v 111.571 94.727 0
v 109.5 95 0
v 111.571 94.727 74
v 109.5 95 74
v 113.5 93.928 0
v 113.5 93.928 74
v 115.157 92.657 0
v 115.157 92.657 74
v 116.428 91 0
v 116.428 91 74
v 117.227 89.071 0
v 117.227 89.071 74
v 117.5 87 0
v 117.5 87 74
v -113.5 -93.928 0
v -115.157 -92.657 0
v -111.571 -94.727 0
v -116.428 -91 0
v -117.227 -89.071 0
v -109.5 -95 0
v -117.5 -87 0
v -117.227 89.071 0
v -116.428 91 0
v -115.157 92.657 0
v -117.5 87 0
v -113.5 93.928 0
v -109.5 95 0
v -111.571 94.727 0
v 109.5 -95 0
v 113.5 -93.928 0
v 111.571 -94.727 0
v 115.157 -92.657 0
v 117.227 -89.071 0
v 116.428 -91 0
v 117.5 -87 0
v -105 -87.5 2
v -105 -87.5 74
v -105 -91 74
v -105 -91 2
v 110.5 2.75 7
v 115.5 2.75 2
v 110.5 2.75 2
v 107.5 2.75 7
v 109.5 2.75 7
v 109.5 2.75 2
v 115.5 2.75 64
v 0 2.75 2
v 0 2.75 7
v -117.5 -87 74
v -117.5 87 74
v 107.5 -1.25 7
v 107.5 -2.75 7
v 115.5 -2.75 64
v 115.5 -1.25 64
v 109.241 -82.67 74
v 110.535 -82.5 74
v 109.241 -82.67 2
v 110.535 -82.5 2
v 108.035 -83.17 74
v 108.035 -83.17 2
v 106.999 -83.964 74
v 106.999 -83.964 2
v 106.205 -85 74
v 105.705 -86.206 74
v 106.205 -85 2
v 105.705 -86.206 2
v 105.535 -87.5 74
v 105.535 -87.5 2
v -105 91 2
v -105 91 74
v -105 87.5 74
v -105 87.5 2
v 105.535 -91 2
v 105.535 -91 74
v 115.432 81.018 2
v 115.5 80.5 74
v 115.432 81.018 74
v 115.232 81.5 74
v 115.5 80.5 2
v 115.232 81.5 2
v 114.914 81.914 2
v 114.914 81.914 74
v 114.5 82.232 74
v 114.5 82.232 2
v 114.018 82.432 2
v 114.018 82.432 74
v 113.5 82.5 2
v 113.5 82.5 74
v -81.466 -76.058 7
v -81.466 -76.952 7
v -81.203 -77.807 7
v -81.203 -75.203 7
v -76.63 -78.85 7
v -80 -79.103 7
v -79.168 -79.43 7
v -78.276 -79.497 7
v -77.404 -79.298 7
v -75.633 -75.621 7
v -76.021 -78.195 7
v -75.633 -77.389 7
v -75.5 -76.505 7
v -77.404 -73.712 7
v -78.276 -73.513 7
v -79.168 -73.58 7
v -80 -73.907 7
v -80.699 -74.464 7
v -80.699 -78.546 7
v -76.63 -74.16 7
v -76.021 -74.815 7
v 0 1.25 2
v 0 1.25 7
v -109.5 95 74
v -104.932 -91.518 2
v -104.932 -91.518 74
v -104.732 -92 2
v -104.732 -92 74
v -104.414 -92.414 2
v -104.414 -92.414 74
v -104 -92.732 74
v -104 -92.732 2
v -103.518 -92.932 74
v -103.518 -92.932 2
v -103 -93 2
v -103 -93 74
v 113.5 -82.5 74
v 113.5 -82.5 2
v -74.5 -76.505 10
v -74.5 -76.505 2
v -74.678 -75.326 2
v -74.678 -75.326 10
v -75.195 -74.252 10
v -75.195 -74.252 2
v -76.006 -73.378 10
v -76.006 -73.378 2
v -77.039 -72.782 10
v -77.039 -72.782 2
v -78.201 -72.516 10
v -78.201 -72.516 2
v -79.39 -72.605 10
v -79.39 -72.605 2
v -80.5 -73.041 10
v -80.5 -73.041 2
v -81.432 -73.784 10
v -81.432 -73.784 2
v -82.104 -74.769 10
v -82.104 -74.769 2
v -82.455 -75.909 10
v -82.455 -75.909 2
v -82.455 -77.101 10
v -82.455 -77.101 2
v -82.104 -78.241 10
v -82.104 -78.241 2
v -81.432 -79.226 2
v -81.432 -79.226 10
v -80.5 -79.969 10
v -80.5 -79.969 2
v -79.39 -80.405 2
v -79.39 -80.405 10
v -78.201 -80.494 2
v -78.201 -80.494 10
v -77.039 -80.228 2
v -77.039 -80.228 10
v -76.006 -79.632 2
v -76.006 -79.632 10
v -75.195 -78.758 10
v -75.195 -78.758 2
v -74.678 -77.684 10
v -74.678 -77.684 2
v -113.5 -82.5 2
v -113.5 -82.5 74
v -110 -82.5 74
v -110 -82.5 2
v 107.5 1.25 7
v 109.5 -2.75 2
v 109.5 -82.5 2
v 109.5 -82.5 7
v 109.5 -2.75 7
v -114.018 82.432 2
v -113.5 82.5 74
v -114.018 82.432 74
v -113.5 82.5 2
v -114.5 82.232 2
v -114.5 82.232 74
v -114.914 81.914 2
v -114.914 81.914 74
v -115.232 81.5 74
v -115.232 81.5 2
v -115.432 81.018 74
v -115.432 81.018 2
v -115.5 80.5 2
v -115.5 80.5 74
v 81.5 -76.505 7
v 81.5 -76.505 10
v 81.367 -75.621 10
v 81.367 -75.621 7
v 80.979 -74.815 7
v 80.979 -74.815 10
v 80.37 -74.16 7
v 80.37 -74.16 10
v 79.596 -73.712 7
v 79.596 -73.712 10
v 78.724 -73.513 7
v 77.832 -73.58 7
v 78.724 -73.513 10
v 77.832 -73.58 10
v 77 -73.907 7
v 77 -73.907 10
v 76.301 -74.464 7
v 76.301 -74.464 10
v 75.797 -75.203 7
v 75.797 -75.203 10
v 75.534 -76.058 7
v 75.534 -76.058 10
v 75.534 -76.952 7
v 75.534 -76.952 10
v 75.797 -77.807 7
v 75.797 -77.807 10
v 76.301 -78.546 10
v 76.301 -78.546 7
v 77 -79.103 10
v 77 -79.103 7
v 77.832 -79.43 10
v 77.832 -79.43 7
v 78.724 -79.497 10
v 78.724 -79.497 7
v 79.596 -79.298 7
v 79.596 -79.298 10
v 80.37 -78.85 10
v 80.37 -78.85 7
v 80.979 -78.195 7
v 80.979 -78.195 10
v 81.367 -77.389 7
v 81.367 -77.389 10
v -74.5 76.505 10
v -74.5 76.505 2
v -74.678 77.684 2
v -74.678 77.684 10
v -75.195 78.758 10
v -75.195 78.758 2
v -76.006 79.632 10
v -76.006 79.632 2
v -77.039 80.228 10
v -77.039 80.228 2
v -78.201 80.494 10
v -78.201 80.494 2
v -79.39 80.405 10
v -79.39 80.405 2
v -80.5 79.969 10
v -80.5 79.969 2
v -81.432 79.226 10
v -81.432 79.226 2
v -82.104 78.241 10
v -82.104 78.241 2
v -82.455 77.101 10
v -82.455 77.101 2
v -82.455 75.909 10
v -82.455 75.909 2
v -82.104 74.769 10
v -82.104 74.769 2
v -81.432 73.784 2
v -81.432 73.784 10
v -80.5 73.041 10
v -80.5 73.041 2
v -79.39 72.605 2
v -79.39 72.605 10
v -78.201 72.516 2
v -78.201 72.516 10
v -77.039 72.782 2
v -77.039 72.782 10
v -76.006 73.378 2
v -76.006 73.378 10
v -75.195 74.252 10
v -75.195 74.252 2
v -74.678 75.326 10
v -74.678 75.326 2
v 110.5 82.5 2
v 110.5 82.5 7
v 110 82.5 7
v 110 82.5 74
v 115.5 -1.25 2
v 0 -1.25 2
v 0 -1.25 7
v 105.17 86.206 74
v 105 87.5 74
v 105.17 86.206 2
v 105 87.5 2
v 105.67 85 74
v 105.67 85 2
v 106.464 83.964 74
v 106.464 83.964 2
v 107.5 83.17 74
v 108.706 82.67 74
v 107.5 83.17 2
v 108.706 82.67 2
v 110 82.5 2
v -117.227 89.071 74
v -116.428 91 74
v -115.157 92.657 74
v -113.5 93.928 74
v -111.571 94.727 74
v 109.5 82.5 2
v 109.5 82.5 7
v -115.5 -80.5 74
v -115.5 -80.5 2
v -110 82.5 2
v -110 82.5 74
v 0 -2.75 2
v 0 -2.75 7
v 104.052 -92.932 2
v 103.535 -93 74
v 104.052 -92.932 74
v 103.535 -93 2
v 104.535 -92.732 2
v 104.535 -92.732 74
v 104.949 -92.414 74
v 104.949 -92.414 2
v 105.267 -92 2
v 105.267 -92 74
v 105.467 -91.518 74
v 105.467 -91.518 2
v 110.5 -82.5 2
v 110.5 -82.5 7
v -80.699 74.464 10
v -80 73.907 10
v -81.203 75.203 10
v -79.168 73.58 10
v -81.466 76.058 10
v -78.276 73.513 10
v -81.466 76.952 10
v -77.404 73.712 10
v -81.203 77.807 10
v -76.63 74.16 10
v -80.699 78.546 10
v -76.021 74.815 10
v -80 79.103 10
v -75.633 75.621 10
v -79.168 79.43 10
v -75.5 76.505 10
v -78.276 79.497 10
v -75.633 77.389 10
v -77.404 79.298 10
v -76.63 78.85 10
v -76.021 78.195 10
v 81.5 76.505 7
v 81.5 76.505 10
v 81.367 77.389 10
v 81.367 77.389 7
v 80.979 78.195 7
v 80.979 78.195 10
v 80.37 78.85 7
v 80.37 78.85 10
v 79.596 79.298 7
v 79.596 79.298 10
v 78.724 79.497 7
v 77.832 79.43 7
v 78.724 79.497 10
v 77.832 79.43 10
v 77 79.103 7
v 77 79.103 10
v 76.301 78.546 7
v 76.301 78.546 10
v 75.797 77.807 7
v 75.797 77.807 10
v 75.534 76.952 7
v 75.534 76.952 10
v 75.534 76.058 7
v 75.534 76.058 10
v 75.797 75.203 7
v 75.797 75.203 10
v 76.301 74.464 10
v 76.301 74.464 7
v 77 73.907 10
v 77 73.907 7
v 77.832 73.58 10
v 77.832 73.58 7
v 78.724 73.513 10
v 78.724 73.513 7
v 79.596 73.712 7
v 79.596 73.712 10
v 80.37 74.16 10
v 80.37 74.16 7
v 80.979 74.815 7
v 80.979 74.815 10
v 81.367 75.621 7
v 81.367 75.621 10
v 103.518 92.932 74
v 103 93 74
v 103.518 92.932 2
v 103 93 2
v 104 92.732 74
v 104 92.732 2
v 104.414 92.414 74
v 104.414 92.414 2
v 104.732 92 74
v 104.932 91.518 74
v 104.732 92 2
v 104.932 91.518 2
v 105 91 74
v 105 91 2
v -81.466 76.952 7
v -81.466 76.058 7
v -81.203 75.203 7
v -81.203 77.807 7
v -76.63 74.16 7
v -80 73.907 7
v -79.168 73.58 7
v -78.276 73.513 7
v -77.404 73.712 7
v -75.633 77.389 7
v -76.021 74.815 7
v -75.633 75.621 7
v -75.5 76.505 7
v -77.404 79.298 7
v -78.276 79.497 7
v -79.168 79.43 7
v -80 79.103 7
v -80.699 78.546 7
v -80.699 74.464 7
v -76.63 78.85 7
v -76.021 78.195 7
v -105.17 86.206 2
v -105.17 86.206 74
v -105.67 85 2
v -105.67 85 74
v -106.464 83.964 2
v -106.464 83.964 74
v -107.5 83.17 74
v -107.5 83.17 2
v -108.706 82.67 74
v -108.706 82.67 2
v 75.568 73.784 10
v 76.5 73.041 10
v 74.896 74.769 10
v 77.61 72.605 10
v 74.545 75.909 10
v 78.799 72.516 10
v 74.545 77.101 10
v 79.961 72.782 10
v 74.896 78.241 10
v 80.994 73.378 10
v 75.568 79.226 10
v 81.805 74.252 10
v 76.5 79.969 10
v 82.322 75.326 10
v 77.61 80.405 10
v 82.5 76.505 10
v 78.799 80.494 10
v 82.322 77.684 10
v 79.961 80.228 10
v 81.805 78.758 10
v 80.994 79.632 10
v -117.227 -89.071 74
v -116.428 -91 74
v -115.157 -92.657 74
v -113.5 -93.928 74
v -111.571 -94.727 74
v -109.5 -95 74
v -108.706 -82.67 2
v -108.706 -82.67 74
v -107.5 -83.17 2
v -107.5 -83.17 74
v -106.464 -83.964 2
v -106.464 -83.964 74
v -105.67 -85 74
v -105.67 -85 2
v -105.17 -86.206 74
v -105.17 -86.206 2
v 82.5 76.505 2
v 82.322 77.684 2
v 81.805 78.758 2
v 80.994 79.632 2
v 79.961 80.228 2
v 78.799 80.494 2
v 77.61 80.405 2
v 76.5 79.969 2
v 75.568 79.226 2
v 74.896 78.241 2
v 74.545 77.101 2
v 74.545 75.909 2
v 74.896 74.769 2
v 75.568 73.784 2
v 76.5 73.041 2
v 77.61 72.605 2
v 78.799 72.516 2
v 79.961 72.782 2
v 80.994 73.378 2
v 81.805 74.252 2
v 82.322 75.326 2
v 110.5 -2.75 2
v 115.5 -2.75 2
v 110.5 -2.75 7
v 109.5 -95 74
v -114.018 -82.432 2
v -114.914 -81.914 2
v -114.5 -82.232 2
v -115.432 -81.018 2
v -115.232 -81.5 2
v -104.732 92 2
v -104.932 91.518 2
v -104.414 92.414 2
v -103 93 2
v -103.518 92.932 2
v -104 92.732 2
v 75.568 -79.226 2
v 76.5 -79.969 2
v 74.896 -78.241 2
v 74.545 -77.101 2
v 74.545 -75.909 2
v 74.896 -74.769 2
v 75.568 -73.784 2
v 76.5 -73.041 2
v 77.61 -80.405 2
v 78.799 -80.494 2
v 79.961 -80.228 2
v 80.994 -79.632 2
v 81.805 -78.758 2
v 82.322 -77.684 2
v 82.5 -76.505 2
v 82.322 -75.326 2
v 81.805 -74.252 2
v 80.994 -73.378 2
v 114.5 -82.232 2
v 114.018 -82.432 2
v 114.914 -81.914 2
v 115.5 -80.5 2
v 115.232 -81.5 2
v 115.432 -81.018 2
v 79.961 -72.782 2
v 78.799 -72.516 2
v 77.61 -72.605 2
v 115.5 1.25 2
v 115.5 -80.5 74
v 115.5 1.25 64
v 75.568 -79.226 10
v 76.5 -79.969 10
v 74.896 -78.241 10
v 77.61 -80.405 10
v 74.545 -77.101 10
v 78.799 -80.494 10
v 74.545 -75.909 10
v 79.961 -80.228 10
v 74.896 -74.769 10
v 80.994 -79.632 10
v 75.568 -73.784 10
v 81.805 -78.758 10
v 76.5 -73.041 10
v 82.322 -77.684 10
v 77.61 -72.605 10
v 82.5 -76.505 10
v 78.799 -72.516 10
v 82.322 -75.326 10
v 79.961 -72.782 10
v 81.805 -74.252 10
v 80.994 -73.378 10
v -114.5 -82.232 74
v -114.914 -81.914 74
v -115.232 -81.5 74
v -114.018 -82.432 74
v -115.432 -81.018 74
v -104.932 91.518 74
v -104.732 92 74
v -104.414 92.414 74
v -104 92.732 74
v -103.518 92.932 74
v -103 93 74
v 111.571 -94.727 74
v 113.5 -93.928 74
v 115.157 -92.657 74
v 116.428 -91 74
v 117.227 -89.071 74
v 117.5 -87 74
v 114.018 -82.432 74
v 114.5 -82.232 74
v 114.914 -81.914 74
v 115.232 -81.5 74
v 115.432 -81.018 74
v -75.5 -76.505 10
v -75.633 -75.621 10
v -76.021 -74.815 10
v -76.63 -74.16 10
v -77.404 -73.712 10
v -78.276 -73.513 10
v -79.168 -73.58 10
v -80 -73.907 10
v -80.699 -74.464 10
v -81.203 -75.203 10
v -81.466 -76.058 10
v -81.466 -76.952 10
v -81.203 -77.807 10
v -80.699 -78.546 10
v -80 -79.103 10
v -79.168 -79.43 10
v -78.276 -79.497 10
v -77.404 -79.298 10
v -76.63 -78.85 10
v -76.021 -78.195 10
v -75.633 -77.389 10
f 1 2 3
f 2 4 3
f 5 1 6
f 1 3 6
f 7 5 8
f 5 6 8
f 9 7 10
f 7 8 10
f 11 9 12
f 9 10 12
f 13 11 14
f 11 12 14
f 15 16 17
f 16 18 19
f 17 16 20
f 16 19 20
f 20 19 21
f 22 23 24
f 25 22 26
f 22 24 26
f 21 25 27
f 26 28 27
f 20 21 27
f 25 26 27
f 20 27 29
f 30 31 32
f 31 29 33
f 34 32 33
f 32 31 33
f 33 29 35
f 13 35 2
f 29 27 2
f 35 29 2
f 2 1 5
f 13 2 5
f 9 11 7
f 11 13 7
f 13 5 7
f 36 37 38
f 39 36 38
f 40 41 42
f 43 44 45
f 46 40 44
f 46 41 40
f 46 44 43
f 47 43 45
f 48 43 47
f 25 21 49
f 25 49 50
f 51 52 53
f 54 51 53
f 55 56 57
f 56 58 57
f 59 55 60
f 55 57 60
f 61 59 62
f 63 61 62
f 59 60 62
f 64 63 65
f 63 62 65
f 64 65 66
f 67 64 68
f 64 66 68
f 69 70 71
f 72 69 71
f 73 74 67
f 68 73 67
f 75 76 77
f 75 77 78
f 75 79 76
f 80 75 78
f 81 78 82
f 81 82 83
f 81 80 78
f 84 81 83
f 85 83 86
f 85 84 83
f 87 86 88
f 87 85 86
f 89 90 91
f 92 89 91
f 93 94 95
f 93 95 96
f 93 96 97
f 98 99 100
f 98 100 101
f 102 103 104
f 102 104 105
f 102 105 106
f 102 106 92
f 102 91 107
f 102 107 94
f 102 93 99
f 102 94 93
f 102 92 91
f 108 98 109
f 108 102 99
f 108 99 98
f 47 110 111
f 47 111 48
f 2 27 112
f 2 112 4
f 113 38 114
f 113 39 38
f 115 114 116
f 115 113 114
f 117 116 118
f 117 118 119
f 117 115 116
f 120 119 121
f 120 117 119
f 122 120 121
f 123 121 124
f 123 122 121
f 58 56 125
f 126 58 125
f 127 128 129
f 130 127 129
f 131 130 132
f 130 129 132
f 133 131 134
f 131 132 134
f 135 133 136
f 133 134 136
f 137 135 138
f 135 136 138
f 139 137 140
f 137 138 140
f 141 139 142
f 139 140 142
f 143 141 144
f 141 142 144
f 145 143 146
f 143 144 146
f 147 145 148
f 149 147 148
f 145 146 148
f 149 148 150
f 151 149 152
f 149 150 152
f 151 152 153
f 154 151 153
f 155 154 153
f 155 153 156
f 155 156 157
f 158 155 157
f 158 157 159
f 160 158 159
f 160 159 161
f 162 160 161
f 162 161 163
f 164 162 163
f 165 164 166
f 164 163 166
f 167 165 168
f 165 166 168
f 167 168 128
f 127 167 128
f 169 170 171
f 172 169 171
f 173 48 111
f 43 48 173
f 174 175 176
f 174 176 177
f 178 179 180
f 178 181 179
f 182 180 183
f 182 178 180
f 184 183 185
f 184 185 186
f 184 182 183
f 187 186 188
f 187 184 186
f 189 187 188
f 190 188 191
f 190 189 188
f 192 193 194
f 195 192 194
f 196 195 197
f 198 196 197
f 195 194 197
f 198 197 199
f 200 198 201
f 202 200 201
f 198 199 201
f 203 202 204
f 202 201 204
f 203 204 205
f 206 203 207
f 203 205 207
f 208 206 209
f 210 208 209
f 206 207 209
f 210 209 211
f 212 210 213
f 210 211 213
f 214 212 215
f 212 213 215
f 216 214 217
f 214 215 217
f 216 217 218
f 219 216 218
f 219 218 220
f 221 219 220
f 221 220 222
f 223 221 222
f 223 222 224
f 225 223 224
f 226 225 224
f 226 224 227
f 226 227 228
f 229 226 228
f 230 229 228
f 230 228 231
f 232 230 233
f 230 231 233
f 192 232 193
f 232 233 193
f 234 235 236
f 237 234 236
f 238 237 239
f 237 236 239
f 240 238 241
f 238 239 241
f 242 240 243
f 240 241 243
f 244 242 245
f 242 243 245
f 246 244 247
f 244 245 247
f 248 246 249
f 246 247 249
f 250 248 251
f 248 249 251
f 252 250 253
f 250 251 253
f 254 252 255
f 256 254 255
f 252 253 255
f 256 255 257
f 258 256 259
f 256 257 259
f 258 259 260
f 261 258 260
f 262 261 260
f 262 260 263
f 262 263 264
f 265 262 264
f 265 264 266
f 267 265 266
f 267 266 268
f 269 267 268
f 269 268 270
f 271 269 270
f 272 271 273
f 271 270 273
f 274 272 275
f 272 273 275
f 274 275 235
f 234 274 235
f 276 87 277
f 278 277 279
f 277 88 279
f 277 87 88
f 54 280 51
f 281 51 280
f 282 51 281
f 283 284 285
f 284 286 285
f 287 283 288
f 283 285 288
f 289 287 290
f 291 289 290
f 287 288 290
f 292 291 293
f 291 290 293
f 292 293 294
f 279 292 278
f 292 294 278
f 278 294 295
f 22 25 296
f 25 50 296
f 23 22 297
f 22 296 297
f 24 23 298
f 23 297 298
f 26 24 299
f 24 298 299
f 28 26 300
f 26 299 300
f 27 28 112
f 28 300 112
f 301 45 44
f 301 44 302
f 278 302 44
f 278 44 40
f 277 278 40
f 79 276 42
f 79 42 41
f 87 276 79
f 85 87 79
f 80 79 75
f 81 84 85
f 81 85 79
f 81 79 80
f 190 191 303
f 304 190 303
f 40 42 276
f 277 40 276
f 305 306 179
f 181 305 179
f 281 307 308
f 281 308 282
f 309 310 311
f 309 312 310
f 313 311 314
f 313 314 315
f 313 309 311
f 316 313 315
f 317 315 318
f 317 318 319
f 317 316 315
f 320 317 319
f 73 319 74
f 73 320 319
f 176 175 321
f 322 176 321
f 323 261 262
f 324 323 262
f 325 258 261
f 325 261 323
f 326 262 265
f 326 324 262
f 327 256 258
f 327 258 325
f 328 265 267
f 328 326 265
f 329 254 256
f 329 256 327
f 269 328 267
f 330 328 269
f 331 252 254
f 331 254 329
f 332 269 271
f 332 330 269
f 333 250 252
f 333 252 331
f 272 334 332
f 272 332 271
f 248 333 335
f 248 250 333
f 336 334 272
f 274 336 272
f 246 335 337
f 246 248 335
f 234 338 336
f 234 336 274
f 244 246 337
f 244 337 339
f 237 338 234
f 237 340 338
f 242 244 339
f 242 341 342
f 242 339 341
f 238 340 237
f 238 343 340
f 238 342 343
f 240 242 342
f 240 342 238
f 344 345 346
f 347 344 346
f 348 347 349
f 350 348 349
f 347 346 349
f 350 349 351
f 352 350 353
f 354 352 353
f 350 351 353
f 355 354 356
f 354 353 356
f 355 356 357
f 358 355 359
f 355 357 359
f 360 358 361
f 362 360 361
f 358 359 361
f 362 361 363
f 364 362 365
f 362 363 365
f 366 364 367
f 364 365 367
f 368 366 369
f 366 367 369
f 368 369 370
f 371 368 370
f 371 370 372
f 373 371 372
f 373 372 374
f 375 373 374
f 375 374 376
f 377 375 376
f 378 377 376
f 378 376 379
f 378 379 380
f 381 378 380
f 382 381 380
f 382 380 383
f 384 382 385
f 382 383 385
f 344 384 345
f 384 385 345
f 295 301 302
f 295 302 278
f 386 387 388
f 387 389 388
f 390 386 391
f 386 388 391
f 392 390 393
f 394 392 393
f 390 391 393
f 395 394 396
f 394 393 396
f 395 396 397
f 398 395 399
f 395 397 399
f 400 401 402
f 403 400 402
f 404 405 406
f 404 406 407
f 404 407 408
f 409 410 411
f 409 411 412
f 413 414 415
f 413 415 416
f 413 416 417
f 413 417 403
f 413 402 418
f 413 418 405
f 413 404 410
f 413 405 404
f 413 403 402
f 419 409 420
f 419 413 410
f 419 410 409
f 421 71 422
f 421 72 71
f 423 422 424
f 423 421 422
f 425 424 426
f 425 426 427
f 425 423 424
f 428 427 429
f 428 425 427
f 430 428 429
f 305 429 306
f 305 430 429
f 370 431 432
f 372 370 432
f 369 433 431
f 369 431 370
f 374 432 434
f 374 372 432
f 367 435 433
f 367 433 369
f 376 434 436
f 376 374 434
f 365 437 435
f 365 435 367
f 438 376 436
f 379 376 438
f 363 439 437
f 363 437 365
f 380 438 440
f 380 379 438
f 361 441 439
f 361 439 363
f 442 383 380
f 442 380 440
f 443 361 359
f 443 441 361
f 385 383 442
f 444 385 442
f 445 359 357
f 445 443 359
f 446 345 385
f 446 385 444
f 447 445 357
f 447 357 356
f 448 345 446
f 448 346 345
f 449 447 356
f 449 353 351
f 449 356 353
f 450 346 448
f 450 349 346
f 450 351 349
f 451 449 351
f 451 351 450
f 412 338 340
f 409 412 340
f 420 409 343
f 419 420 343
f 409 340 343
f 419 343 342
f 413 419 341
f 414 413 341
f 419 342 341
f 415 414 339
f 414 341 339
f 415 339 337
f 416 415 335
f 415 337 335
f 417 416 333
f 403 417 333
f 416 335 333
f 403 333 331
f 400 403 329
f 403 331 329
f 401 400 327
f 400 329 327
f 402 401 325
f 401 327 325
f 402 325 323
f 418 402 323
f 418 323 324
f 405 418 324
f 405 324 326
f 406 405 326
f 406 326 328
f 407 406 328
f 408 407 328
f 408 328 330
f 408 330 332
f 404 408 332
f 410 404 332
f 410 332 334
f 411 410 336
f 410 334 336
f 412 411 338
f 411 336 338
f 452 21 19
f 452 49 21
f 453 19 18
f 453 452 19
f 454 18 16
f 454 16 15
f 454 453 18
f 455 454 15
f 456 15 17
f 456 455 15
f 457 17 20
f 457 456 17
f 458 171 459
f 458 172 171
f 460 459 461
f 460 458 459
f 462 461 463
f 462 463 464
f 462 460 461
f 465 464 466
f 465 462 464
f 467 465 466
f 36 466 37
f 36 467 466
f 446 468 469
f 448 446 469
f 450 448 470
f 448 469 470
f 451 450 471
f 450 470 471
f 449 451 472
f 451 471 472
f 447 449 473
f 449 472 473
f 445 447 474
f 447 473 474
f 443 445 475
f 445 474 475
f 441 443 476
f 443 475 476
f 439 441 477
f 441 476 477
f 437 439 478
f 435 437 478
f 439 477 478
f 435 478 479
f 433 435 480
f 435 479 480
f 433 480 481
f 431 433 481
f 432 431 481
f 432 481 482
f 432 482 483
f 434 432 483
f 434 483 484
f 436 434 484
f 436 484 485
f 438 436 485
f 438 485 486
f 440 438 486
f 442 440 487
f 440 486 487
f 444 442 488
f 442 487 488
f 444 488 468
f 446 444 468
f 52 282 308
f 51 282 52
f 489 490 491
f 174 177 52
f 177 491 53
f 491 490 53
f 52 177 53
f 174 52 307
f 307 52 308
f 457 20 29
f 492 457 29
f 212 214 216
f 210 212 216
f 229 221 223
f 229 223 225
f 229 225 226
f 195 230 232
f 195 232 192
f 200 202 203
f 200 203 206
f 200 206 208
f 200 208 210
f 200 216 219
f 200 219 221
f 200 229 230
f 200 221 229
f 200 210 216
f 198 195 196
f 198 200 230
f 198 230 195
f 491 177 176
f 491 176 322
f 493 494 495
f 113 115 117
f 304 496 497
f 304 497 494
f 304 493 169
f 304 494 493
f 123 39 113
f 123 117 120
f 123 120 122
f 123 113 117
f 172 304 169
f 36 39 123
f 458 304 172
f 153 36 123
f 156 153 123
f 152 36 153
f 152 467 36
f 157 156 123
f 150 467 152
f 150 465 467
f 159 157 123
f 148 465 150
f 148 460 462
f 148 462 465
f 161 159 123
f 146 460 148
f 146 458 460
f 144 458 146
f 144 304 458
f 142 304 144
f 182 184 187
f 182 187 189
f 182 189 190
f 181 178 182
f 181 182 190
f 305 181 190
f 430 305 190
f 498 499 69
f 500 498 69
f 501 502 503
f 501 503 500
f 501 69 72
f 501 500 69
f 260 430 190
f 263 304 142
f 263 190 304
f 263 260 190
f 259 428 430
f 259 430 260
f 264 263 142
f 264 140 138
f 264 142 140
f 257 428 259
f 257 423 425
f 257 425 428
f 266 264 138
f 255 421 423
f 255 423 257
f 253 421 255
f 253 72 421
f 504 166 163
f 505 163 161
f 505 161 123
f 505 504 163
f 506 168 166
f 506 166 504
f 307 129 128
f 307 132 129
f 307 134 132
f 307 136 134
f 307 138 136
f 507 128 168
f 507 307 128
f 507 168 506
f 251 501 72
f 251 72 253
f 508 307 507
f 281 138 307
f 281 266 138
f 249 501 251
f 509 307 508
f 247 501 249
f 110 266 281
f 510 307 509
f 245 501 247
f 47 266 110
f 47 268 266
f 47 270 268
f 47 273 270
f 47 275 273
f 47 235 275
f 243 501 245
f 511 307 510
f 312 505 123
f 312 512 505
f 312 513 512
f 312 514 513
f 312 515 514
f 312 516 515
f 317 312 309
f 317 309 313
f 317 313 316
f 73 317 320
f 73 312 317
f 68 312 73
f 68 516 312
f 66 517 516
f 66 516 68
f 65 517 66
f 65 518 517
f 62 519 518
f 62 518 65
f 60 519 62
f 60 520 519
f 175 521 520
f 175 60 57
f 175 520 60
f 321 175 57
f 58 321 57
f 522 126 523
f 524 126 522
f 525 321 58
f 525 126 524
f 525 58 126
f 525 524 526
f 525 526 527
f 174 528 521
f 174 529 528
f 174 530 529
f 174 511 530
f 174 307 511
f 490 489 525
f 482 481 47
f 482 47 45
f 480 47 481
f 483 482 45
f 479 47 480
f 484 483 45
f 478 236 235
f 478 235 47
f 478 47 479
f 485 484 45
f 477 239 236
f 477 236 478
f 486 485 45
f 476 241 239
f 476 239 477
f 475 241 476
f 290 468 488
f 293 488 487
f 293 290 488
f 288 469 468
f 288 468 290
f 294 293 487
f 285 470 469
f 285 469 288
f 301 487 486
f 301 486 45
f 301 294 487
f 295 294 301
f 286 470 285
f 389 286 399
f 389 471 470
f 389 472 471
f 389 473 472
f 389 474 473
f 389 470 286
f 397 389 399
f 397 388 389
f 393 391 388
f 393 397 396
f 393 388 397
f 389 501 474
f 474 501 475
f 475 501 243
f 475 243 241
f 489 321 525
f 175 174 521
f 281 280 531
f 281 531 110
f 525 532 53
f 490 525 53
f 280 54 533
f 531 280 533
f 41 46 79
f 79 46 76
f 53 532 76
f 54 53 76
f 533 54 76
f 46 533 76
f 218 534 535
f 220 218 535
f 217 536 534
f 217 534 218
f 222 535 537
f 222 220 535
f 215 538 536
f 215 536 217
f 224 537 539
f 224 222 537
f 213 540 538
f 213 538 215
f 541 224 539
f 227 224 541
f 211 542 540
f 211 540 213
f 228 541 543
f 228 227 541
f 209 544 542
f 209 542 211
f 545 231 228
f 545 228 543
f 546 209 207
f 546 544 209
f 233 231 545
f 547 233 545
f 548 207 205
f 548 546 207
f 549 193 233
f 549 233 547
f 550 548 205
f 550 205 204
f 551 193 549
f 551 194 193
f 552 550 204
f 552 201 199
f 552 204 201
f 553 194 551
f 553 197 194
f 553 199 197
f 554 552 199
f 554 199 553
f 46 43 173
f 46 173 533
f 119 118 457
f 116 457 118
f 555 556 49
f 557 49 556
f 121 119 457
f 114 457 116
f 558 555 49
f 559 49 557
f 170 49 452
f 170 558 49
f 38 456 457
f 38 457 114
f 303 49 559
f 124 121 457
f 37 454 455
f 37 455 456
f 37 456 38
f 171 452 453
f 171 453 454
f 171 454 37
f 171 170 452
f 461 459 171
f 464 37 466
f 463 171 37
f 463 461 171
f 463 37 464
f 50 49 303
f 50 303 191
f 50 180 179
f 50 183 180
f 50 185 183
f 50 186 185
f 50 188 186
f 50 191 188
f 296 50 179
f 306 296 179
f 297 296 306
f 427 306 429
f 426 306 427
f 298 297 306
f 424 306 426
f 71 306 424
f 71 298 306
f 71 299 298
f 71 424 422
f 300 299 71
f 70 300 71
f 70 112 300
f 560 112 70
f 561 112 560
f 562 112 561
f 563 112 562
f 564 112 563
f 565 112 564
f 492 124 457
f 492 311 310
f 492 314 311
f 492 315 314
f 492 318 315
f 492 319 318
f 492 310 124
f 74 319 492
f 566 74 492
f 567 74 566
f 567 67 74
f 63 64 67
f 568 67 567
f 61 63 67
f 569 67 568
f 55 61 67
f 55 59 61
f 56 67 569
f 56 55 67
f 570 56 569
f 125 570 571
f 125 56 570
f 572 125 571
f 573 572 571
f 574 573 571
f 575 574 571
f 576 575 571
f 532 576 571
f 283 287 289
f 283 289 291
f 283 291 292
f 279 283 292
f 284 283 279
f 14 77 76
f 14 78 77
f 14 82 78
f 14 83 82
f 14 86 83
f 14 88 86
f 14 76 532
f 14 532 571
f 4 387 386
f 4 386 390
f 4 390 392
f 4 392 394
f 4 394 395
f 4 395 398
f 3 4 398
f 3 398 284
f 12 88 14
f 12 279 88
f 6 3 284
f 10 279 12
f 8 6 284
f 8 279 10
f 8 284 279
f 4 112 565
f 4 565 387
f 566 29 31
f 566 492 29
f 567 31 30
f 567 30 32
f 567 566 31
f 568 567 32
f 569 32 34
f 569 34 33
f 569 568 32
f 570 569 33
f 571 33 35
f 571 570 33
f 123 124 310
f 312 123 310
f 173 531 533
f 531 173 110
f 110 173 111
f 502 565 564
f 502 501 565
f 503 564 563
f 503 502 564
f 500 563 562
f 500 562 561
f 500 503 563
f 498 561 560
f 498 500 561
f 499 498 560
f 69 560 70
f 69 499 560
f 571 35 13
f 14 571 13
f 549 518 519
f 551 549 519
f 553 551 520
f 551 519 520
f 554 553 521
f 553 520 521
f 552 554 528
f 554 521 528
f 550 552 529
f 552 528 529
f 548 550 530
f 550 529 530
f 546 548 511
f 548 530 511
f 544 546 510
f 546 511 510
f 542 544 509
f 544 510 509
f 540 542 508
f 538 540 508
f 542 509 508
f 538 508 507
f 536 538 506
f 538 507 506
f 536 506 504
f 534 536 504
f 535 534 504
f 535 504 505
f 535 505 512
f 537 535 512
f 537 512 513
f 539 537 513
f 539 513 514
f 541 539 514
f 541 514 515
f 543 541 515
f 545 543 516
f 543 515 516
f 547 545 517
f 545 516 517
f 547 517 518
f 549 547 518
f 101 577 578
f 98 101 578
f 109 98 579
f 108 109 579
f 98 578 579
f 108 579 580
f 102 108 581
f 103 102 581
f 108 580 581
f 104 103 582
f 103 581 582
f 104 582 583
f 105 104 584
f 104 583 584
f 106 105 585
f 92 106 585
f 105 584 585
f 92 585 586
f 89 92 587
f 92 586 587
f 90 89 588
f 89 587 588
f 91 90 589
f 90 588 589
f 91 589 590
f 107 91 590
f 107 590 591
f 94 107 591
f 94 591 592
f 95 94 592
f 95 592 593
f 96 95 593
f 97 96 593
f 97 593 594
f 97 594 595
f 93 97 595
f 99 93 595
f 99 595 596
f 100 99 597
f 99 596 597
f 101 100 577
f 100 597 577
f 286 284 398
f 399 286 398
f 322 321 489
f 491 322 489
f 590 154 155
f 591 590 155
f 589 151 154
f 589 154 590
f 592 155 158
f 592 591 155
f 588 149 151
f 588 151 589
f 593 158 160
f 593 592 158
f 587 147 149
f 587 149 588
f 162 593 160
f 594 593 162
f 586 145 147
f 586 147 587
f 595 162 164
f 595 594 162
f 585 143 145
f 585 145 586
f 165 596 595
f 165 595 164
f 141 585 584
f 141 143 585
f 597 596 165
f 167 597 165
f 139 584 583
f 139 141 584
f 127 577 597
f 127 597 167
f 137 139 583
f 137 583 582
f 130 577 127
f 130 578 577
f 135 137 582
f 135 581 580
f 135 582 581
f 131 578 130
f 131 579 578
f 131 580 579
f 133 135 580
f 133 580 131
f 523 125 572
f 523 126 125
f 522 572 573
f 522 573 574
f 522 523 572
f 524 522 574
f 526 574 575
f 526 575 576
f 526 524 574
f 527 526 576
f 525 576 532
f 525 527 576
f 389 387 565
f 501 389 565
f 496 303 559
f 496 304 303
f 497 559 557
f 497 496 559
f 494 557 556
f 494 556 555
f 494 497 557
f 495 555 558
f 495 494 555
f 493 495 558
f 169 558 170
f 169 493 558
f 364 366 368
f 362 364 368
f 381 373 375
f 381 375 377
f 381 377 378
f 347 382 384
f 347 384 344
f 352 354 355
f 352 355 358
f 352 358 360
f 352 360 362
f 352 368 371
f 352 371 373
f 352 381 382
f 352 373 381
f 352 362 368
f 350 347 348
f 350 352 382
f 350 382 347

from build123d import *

# Parameters (mm, degrees)
SKETCH1_W           = 235
SKETCH1_H           = 190
BOSS_EXTRUDE1_DEPTH = 74
CUT_EXTRUDE1_DEPTH  = 72
FILLET1_R           = 2
FILLET2_R           = 5
SKETCH3_R           = 4
BOSS_EXTRUDE2_DEPTH = 8
FILLET3_R           = 8
SKETCH4_R           = 3
CUT_EXTRUDE2_DEPTH  = 3
SKETCH5_W           = 1
SKETCH5_H           = 165
BOSS_EXTRUDE3_DEPTH = 5
SKETCH6_W           = 115.5
SKETCH6_H           = 1.5
BOSS_EXTRUDE4_DEPTH = 5
BOSS_EXTRUDE5_DEPTH = 1.5
SKETCH8_W           = 5
SKETCH8_H           = 2.5
CUT_EXTRUDE3_DEPTH  = 5


with BuildPart() as part:
    # Sketch1 → Boss-Extrude1 (new body)
    with BuildSketch(Plane.XY):
        Rectangle(SKETCH1_W, SKETCH1_H)
    extrude(amount=BOSS_EXTRUDE1_DEPTH)

    # Sketch2 → Cut-Extrude1 (cut)
    with BuildSketch(Plane.XY.offset(74)):
        Polygon((105, 93), (-105, 93), (-105, 82.5), (-115.5, 82.5), (-115.5, -82.5), (-105, -82.5), (-105, -93), (105.534797486, -93), (105.534797486, -82.5), (115.5, -82.5), (115.5, 82.5), (105, 82.5), align=None)
    extrude(amount=-CUT_EXTRUDE1_DEPTH, mode=Mode.SUBTRACT)

    # Fillet1
    fillet1_edges = [part.edges().sort_by_distance(p)[0] for p in [
        (-105, -93, 38),
        (-115.5, -82.5, 38),
        (-115.5, 82.5, 38),
        (-105, 93, 38),
        (105, 93, 38),
        (115.5, 82.5, 38),
        (115.5, -82.5, 38),
        (105.534797486, -93, 38),
    ]]
    fillet(fillet1_edges, radius=FILLET1_R)

    # Fillet2
    fillet2_edges = [part.edges().sort_by_distance(p)[0] for p in [
        (-105, -82.5, 38),
        (-105, 82.5, 38),
        (105, 82.5, 38),
        (105.534797486, -82.5, 38),
    ]]
    fillet(fillet2_edges, radius=FILLET2_R)

    # Sketch3 → Boss-Extrude2 (add)
    with BuildSketch(Plane.XY.offset(2)):
        with Locations((-78.5, 76.505)):
            Circle(SKETCH3_R)
        with Locations((78.5, 76.505)):
            Circle(SKETCH3_R)
        with Locations((78.5, -76.505)):
            Circle(SKETCH3_R)
        with Locations((-78.5, -76.505)):
            Circle(SKETCH3_R)
    extrude(amount=BOSS_EXTRUDE2_DEPTH)

    # Fillet3
    fillet3_edges = [part.edges().sort_by_distance(p)[0] for p in [
        (117.5, -95, 37),
        (-117.5, -95, 37),
        (-117.5, 95, 37),
        (117.5, 95, 37),
    ]]
    fillet(fillet3_edges, radius=FILLET3_R)

    # Sketch4 → Cut-Extrude2 (cut)
    with BuildSketch(Plane.XY.offset(10)):
        with Locations((78.5, 76.505)):
            Circle(SKETCH4_R)
        with Locations((78.5, -76.505)):
            Circle(SKETCH4_R)
        with Locations((-78.5, -76.505)):
            Circle(SKETCH4_R)
        with Locations((-78.5, 76.505)):
            Circle(SKETCH4_R)
    extrude(amount=-CUT_EXTRUDE2_DEPTH, mode=Mode.SUBTRACT)

    # Sketch5 → Boss-Extrude3 (add)
    with BuildSketch(Plane.XY.offset(2)):
        with Locations((110, 0)):
            Rectangle(SKETCH5_W, SKETCH5_H)
    extrude(amount=BOSS_EXTRUDE3_DEPTH)

    # Sketch6 → Boss-Extrude4 (add)
    with BuildSketch(Plane.XY.offset(2)):
        with Locations((57.75, 2)):
            Rectangle(SKETCH6_W, SKETCH6_H)
        with Locations((57.75, -2)):
            Rectangle(SKETCH6_W, SKETCH6_H)
    extrude(amount=BOSS_EXTRUDE4_DEPTH)

    # Sketch7 → Boss-Extrude5 (add)
    with BuildSketch(Plane.XZ.offset(2.75)):
        Polygon((107.5, 7), (115.5, 64), (115.5, 7), align=None)
    boss_extrude5 = extrude(amount=-BOSS_EXTRUDE5_DEPTH)

    # Mirror1: Boss-Extrude5 across plane
    add(boss_extrude5.mirror(Plane.ZX))

    # Sketch8 → Cut-Extrude3 (cut)
    with BuildSketch(Plane.ZY.offset(-109.5)):
        with Locations((4.5, 0)):
            Rectangle(SKETCH8_W, SKETCH8_H)
    extrude(amount=-CUT_EXTRUDE3_DEPTH, mode=Mode.SUBTRACT)


solid = part.part
